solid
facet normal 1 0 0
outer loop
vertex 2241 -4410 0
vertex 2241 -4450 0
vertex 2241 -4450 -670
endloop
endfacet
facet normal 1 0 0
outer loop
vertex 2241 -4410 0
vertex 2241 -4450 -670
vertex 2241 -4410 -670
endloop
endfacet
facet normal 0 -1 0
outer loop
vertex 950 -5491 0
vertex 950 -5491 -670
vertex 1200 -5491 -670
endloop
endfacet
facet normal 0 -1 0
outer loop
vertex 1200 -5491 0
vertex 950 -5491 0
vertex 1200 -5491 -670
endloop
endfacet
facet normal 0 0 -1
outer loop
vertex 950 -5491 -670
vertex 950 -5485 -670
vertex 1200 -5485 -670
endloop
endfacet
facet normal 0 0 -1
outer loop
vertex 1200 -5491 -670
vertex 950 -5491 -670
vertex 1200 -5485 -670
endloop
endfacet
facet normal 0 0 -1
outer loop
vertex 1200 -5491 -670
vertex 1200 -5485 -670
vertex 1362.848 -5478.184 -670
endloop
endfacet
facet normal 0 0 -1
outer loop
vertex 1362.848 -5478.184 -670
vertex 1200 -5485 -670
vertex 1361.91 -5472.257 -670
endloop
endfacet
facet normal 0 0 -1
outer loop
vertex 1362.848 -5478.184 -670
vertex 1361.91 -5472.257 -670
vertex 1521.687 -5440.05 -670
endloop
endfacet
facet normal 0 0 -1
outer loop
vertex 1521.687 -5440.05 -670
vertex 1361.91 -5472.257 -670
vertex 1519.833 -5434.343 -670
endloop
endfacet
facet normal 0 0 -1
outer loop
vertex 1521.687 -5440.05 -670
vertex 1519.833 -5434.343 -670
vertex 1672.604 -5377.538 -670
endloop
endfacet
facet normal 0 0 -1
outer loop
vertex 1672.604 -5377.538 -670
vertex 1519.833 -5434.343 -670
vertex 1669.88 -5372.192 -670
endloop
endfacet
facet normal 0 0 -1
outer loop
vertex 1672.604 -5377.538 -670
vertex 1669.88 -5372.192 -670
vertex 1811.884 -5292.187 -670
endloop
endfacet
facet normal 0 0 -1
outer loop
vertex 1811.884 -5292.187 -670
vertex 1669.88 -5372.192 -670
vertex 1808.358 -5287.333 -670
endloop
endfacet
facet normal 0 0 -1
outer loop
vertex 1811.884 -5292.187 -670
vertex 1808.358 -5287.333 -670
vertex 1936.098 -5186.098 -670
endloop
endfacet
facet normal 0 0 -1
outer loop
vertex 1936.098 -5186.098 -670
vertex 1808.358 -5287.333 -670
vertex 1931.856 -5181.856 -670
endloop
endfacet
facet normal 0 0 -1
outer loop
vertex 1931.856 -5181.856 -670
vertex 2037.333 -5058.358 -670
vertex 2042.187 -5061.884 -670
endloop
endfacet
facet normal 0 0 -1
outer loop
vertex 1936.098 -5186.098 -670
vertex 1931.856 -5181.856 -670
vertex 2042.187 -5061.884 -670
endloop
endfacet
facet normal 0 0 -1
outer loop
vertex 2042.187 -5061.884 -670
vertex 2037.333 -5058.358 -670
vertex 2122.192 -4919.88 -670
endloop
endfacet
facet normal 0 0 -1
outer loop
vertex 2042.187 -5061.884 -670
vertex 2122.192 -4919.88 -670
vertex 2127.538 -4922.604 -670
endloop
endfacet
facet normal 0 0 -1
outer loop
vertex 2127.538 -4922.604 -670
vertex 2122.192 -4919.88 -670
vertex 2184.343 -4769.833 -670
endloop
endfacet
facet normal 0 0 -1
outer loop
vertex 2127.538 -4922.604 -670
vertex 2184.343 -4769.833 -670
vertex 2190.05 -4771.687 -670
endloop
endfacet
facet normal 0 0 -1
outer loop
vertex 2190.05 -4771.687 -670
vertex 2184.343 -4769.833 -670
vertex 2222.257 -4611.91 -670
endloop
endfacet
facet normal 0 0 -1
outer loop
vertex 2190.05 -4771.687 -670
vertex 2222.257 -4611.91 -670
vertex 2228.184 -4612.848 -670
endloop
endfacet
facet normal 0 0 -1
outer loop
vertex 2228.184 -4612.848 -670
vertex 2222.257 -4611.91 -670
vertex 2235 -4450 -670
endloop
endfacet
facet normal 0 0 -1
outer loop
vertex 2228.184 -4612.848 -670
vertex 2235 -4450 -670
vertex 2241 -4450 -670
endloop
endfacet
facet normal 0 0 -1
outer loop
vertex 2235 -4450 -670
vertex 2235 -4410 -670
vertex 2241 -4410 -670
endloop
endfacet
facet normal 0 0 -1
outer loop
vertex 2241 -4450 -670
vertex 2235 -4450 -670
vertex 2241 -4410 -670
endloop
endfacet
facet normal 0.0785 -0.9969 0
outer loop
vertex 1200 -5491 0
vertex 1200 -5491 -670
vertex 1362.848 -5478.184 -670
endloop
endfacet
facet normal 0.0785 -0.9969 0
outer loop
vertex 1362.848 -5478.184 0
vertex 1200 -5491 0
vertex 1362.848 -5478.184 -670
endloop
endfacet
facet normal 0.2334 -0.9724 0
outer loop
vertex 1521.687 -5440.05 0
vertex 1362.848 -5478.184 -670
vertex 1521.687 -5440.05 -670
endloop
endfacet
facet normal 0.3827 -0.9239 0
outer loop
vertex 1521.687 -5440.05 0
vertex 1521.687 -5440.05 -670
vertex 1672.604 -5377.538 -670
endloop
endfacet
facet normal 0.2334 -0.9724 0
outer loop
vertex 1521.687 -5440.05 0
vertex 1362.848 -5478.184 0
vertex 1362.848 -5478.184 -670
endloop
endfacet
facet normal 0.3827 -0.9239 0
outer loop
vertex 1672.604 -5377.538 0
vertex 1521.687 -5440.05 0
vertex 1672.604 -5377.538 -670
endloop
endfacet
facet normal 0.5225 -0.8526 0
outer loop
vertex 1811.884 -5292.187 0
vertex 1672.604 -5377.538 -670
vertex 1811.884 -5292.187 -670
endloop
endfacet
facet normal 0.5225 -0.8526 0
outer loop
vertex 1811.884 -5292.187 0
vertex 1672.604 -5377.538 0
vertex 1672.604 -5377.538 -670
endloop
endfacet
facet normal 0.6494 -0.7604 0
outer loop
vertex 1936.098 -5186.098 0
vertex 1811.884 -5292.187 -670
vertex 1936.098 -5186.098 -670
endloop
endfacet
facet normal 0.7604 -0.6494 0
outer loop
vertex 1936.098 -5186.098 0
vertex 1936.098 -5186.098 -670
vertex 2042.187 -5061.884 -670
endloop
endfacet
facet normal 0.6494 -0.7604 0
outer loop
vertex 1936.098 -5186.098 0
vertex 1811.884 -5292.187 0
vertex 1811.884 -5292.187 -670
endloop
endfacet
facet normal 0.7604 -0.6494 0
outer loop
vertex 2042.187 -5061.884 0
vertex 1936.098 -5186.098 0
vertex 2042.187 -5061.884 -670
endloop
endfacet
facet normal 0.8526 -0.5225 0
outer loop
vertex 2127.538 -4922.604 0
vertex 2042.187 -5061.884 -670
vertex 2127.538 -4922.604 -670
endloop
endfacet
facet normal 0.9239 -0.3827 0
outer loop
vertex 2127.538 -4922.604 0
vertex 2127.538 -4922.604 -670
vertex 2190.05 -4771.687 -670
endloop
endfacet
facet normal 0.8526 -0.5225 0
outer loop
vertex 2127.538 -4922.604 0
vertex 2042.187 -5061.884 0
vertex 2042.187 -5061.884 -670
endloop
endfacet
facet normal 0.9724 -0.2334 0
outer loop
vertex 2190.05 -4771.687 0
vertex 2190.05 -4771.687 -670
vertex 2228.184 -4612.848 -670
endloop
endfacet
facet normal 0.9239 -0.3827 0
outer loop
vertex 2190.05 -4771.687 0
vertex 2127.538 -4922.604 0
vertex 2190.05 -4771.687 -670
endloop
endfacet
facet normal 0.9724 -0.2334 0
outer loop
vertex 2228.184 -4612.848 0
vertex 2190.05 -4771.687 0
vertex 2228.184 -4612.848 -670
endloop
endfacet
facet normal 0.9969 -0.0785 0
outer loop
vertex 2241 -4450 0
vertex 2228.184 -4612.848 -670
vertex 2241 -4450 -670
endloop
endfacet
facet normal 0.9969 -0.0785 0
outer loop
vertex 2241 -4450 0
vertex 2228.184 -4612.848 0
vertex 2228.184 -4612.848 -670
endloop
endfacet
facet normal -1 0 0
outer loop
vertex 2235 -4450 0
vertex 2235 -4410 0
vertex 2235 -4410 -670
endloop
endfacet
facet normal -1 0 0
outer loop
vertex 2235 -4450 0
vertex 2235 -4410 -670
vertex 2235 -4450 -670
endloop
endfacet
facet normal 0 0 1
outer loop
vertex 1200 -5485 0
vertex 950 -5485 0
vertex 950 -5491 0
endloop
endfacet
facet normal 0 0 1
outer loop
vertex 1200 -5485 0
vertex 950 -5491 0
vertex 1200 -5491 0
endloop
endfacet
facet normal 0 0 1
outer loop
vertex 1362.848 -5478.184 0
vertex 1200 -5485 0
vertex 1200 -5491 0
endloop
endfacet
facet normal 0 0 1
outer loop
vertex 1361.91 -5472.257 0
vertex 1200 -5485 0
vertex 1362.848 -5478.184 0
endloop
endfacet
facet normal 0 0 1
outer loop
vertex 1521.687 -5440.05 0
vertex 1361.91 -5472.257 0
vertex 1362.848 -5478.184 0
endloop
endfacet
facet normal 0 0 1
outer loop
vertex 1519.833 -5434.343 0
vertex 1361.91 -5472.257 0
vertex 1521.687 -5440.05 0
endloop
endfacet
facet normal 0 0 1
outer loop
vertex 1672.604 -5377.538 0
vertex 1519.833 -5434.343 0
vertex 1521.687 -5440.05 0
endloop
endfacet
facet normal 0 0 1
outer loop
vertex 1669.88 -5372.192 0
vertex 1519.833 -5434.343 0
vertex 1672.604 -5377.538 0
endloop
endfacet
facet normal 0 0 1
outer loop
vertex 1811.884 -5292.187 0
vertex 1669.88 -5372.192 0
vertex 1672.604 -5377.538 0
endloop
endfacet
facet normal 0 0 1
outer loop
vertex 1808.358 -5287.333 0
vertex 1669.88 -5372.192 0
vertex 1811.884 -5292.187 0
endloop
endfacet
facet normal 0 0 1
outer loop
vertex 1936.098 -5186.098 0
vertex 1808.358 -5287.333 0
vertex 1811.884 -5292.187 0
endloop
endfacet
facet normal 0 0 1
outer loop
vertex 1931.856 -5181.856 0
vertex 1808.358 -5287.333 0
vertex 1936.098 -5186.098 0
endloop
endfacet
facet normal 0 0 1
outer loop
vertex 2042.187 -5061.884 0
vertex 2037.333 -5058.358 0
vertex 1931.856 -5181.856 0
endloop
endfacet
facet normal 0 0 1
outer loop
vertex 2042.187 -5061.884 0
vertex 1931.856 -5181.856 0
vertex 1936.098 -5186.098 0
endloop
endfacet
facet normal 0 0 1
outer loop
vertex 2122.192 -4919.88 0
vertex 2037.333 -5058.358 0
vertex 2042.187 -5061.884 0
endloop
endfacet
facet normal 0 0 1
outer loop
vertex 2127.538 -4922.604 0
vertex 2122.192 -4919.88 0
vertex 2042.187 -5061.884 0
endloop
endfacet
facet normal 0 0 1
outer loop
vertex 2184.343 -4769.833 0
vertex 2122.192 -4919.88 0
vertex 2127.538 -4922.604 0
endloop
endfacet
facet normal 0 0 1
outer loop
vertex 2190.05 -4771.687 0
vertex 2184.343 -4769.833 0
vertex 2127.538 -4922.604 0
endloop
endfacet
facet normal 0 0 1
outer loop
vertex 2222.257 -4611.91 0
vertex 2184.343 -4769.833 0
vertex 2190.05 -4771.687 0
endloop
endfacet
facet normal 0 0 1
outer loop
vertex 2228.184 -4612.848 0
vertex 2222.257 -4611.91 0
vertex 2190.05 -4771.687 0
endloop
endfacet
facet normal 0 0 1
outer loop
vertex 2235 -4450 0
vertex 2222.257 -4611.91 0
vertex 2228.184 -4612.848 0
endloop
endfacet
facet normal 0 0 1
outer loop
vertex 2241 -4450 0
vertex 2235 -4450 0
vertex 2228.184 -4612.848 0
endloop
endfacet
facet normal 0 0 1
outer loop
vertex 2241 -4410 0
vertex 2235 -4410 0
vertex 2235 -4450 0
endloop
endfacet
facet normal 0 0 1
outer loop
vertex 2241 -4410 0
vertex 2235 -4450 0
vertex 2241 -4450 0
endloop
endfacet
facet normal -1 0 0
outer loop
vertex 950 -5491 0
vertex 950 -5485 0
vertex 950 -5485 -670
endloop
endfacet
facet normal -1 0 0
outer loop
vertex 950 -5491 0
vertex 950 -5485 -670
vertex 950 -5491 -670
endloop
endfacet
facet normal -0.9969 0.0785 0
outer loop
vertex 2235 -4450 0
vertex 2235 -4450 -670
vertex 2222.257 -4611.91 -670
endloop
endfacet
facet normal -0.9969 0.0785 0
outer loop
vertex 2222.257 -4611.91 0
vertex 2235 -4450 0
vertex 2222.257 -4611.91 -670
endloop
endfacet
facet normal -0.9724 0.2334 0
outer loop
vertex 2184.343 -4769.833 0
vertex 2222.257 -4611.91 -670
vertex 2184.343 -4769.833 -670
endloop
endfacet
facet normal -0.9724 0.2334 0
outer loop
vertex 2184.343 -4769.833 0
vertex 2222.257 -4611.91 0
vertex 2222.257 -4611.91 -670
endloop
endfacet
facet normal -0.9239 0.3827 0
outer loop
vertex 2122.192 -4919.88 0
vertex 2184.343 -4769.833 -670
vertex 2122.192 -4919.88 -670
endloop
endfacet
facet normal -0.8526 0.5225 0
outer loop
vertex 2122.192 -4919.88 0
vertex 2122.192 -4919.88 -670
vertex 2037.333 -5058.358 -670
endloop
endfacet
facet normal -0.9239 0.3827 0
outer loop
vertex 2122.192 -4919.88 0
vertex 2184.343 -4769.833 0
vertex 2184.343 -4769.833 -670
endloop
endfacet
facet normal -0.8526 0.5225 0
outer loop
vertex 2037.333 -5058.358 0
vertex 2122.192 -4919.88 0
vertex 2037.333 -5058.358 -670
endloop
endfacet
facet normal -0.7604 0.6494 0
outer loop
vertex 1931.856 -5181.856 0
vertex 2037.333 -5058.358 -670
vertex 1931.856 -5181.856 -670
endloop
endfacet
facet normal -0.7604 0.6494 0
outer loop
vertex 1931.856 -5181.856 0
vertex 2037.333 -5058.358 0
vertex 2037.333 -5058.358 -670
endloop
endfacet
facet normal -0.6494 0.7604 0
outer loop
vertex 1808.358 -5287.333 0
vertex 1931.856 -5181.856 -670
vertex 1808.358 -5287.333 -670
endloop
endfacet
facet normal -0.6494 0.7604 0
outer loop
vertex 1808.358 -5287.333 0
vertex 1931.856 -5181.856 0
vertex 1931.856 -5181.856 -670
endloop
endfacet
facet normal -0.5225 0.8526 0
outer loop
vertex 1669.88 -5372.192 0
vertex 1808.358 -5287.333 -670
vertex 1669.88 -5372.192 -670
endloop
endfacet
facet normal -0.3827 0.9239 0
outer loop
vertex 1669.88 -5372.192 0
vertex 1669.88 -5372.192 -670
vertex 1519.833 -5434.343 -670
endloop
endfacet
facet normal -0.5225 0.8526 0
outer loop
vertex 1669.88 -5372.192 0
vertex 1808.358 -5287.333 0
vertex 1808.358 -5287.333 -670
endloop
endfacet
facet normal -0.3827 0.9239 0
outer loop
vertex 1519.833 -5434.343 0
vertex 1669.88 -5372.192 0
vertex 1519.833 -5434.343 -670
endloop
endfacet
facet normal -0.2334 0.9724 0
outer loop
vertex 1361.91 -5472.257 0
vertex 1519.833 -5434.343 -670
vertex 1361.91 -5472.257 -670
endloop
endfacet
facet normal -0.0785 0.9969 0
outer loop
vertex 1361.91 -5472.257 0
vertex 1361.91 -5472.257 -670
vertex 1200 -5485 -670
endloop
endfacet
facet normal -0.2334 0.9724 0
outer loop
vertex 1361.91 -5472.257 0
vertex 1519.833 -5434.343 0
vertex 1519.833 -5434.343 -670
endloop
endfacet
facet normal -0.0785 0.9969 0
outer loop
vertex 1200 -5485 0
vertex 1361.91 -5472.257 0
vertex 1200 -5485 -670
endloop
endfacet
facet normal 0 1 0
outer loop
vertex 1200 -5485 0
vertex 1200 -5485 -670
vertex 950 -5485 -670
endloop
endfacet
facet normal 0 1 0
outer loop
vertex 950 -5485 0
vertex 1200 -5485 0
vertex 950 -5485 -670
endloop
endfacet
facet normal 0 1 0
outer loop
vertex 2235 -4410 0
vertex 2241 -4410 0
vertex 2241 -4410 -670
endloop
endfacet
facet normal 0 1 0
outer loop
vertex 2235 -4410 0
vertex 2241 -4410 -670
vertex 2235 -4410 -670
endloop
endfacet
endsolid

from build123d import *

# Parameters (mm, degrees)
EXTRUDE_THIN1_DEPTH = 670


with BuildPart() as part:
    # Sketch1 → Extrude-Thin1 (new body)
    with BuildSketch(Plane.XY):
        with BuildLine():
            Line((2235, -4410), (2235, -4450))
            ThreePointArc((2235, -4450), (1931.855518528, -5181.855518528), (1200, -5485))
            Line((1200, -5485), (950, -5485))
            Line((950, -5485), (950, -5491))
            Line((950, -5491), (1200, -5491))
            ThreePointArc((1200, -5491), (1936.098159215, -5186.098159215), (2241, -4450))
            Line((2241, -4450), (2241, -4410))
            Line((2241, -4410), (2235, -4410))
        make_face()
    extrude(amount=-EXTRUDE_THIN1_DEPTH)


solid = part.part
